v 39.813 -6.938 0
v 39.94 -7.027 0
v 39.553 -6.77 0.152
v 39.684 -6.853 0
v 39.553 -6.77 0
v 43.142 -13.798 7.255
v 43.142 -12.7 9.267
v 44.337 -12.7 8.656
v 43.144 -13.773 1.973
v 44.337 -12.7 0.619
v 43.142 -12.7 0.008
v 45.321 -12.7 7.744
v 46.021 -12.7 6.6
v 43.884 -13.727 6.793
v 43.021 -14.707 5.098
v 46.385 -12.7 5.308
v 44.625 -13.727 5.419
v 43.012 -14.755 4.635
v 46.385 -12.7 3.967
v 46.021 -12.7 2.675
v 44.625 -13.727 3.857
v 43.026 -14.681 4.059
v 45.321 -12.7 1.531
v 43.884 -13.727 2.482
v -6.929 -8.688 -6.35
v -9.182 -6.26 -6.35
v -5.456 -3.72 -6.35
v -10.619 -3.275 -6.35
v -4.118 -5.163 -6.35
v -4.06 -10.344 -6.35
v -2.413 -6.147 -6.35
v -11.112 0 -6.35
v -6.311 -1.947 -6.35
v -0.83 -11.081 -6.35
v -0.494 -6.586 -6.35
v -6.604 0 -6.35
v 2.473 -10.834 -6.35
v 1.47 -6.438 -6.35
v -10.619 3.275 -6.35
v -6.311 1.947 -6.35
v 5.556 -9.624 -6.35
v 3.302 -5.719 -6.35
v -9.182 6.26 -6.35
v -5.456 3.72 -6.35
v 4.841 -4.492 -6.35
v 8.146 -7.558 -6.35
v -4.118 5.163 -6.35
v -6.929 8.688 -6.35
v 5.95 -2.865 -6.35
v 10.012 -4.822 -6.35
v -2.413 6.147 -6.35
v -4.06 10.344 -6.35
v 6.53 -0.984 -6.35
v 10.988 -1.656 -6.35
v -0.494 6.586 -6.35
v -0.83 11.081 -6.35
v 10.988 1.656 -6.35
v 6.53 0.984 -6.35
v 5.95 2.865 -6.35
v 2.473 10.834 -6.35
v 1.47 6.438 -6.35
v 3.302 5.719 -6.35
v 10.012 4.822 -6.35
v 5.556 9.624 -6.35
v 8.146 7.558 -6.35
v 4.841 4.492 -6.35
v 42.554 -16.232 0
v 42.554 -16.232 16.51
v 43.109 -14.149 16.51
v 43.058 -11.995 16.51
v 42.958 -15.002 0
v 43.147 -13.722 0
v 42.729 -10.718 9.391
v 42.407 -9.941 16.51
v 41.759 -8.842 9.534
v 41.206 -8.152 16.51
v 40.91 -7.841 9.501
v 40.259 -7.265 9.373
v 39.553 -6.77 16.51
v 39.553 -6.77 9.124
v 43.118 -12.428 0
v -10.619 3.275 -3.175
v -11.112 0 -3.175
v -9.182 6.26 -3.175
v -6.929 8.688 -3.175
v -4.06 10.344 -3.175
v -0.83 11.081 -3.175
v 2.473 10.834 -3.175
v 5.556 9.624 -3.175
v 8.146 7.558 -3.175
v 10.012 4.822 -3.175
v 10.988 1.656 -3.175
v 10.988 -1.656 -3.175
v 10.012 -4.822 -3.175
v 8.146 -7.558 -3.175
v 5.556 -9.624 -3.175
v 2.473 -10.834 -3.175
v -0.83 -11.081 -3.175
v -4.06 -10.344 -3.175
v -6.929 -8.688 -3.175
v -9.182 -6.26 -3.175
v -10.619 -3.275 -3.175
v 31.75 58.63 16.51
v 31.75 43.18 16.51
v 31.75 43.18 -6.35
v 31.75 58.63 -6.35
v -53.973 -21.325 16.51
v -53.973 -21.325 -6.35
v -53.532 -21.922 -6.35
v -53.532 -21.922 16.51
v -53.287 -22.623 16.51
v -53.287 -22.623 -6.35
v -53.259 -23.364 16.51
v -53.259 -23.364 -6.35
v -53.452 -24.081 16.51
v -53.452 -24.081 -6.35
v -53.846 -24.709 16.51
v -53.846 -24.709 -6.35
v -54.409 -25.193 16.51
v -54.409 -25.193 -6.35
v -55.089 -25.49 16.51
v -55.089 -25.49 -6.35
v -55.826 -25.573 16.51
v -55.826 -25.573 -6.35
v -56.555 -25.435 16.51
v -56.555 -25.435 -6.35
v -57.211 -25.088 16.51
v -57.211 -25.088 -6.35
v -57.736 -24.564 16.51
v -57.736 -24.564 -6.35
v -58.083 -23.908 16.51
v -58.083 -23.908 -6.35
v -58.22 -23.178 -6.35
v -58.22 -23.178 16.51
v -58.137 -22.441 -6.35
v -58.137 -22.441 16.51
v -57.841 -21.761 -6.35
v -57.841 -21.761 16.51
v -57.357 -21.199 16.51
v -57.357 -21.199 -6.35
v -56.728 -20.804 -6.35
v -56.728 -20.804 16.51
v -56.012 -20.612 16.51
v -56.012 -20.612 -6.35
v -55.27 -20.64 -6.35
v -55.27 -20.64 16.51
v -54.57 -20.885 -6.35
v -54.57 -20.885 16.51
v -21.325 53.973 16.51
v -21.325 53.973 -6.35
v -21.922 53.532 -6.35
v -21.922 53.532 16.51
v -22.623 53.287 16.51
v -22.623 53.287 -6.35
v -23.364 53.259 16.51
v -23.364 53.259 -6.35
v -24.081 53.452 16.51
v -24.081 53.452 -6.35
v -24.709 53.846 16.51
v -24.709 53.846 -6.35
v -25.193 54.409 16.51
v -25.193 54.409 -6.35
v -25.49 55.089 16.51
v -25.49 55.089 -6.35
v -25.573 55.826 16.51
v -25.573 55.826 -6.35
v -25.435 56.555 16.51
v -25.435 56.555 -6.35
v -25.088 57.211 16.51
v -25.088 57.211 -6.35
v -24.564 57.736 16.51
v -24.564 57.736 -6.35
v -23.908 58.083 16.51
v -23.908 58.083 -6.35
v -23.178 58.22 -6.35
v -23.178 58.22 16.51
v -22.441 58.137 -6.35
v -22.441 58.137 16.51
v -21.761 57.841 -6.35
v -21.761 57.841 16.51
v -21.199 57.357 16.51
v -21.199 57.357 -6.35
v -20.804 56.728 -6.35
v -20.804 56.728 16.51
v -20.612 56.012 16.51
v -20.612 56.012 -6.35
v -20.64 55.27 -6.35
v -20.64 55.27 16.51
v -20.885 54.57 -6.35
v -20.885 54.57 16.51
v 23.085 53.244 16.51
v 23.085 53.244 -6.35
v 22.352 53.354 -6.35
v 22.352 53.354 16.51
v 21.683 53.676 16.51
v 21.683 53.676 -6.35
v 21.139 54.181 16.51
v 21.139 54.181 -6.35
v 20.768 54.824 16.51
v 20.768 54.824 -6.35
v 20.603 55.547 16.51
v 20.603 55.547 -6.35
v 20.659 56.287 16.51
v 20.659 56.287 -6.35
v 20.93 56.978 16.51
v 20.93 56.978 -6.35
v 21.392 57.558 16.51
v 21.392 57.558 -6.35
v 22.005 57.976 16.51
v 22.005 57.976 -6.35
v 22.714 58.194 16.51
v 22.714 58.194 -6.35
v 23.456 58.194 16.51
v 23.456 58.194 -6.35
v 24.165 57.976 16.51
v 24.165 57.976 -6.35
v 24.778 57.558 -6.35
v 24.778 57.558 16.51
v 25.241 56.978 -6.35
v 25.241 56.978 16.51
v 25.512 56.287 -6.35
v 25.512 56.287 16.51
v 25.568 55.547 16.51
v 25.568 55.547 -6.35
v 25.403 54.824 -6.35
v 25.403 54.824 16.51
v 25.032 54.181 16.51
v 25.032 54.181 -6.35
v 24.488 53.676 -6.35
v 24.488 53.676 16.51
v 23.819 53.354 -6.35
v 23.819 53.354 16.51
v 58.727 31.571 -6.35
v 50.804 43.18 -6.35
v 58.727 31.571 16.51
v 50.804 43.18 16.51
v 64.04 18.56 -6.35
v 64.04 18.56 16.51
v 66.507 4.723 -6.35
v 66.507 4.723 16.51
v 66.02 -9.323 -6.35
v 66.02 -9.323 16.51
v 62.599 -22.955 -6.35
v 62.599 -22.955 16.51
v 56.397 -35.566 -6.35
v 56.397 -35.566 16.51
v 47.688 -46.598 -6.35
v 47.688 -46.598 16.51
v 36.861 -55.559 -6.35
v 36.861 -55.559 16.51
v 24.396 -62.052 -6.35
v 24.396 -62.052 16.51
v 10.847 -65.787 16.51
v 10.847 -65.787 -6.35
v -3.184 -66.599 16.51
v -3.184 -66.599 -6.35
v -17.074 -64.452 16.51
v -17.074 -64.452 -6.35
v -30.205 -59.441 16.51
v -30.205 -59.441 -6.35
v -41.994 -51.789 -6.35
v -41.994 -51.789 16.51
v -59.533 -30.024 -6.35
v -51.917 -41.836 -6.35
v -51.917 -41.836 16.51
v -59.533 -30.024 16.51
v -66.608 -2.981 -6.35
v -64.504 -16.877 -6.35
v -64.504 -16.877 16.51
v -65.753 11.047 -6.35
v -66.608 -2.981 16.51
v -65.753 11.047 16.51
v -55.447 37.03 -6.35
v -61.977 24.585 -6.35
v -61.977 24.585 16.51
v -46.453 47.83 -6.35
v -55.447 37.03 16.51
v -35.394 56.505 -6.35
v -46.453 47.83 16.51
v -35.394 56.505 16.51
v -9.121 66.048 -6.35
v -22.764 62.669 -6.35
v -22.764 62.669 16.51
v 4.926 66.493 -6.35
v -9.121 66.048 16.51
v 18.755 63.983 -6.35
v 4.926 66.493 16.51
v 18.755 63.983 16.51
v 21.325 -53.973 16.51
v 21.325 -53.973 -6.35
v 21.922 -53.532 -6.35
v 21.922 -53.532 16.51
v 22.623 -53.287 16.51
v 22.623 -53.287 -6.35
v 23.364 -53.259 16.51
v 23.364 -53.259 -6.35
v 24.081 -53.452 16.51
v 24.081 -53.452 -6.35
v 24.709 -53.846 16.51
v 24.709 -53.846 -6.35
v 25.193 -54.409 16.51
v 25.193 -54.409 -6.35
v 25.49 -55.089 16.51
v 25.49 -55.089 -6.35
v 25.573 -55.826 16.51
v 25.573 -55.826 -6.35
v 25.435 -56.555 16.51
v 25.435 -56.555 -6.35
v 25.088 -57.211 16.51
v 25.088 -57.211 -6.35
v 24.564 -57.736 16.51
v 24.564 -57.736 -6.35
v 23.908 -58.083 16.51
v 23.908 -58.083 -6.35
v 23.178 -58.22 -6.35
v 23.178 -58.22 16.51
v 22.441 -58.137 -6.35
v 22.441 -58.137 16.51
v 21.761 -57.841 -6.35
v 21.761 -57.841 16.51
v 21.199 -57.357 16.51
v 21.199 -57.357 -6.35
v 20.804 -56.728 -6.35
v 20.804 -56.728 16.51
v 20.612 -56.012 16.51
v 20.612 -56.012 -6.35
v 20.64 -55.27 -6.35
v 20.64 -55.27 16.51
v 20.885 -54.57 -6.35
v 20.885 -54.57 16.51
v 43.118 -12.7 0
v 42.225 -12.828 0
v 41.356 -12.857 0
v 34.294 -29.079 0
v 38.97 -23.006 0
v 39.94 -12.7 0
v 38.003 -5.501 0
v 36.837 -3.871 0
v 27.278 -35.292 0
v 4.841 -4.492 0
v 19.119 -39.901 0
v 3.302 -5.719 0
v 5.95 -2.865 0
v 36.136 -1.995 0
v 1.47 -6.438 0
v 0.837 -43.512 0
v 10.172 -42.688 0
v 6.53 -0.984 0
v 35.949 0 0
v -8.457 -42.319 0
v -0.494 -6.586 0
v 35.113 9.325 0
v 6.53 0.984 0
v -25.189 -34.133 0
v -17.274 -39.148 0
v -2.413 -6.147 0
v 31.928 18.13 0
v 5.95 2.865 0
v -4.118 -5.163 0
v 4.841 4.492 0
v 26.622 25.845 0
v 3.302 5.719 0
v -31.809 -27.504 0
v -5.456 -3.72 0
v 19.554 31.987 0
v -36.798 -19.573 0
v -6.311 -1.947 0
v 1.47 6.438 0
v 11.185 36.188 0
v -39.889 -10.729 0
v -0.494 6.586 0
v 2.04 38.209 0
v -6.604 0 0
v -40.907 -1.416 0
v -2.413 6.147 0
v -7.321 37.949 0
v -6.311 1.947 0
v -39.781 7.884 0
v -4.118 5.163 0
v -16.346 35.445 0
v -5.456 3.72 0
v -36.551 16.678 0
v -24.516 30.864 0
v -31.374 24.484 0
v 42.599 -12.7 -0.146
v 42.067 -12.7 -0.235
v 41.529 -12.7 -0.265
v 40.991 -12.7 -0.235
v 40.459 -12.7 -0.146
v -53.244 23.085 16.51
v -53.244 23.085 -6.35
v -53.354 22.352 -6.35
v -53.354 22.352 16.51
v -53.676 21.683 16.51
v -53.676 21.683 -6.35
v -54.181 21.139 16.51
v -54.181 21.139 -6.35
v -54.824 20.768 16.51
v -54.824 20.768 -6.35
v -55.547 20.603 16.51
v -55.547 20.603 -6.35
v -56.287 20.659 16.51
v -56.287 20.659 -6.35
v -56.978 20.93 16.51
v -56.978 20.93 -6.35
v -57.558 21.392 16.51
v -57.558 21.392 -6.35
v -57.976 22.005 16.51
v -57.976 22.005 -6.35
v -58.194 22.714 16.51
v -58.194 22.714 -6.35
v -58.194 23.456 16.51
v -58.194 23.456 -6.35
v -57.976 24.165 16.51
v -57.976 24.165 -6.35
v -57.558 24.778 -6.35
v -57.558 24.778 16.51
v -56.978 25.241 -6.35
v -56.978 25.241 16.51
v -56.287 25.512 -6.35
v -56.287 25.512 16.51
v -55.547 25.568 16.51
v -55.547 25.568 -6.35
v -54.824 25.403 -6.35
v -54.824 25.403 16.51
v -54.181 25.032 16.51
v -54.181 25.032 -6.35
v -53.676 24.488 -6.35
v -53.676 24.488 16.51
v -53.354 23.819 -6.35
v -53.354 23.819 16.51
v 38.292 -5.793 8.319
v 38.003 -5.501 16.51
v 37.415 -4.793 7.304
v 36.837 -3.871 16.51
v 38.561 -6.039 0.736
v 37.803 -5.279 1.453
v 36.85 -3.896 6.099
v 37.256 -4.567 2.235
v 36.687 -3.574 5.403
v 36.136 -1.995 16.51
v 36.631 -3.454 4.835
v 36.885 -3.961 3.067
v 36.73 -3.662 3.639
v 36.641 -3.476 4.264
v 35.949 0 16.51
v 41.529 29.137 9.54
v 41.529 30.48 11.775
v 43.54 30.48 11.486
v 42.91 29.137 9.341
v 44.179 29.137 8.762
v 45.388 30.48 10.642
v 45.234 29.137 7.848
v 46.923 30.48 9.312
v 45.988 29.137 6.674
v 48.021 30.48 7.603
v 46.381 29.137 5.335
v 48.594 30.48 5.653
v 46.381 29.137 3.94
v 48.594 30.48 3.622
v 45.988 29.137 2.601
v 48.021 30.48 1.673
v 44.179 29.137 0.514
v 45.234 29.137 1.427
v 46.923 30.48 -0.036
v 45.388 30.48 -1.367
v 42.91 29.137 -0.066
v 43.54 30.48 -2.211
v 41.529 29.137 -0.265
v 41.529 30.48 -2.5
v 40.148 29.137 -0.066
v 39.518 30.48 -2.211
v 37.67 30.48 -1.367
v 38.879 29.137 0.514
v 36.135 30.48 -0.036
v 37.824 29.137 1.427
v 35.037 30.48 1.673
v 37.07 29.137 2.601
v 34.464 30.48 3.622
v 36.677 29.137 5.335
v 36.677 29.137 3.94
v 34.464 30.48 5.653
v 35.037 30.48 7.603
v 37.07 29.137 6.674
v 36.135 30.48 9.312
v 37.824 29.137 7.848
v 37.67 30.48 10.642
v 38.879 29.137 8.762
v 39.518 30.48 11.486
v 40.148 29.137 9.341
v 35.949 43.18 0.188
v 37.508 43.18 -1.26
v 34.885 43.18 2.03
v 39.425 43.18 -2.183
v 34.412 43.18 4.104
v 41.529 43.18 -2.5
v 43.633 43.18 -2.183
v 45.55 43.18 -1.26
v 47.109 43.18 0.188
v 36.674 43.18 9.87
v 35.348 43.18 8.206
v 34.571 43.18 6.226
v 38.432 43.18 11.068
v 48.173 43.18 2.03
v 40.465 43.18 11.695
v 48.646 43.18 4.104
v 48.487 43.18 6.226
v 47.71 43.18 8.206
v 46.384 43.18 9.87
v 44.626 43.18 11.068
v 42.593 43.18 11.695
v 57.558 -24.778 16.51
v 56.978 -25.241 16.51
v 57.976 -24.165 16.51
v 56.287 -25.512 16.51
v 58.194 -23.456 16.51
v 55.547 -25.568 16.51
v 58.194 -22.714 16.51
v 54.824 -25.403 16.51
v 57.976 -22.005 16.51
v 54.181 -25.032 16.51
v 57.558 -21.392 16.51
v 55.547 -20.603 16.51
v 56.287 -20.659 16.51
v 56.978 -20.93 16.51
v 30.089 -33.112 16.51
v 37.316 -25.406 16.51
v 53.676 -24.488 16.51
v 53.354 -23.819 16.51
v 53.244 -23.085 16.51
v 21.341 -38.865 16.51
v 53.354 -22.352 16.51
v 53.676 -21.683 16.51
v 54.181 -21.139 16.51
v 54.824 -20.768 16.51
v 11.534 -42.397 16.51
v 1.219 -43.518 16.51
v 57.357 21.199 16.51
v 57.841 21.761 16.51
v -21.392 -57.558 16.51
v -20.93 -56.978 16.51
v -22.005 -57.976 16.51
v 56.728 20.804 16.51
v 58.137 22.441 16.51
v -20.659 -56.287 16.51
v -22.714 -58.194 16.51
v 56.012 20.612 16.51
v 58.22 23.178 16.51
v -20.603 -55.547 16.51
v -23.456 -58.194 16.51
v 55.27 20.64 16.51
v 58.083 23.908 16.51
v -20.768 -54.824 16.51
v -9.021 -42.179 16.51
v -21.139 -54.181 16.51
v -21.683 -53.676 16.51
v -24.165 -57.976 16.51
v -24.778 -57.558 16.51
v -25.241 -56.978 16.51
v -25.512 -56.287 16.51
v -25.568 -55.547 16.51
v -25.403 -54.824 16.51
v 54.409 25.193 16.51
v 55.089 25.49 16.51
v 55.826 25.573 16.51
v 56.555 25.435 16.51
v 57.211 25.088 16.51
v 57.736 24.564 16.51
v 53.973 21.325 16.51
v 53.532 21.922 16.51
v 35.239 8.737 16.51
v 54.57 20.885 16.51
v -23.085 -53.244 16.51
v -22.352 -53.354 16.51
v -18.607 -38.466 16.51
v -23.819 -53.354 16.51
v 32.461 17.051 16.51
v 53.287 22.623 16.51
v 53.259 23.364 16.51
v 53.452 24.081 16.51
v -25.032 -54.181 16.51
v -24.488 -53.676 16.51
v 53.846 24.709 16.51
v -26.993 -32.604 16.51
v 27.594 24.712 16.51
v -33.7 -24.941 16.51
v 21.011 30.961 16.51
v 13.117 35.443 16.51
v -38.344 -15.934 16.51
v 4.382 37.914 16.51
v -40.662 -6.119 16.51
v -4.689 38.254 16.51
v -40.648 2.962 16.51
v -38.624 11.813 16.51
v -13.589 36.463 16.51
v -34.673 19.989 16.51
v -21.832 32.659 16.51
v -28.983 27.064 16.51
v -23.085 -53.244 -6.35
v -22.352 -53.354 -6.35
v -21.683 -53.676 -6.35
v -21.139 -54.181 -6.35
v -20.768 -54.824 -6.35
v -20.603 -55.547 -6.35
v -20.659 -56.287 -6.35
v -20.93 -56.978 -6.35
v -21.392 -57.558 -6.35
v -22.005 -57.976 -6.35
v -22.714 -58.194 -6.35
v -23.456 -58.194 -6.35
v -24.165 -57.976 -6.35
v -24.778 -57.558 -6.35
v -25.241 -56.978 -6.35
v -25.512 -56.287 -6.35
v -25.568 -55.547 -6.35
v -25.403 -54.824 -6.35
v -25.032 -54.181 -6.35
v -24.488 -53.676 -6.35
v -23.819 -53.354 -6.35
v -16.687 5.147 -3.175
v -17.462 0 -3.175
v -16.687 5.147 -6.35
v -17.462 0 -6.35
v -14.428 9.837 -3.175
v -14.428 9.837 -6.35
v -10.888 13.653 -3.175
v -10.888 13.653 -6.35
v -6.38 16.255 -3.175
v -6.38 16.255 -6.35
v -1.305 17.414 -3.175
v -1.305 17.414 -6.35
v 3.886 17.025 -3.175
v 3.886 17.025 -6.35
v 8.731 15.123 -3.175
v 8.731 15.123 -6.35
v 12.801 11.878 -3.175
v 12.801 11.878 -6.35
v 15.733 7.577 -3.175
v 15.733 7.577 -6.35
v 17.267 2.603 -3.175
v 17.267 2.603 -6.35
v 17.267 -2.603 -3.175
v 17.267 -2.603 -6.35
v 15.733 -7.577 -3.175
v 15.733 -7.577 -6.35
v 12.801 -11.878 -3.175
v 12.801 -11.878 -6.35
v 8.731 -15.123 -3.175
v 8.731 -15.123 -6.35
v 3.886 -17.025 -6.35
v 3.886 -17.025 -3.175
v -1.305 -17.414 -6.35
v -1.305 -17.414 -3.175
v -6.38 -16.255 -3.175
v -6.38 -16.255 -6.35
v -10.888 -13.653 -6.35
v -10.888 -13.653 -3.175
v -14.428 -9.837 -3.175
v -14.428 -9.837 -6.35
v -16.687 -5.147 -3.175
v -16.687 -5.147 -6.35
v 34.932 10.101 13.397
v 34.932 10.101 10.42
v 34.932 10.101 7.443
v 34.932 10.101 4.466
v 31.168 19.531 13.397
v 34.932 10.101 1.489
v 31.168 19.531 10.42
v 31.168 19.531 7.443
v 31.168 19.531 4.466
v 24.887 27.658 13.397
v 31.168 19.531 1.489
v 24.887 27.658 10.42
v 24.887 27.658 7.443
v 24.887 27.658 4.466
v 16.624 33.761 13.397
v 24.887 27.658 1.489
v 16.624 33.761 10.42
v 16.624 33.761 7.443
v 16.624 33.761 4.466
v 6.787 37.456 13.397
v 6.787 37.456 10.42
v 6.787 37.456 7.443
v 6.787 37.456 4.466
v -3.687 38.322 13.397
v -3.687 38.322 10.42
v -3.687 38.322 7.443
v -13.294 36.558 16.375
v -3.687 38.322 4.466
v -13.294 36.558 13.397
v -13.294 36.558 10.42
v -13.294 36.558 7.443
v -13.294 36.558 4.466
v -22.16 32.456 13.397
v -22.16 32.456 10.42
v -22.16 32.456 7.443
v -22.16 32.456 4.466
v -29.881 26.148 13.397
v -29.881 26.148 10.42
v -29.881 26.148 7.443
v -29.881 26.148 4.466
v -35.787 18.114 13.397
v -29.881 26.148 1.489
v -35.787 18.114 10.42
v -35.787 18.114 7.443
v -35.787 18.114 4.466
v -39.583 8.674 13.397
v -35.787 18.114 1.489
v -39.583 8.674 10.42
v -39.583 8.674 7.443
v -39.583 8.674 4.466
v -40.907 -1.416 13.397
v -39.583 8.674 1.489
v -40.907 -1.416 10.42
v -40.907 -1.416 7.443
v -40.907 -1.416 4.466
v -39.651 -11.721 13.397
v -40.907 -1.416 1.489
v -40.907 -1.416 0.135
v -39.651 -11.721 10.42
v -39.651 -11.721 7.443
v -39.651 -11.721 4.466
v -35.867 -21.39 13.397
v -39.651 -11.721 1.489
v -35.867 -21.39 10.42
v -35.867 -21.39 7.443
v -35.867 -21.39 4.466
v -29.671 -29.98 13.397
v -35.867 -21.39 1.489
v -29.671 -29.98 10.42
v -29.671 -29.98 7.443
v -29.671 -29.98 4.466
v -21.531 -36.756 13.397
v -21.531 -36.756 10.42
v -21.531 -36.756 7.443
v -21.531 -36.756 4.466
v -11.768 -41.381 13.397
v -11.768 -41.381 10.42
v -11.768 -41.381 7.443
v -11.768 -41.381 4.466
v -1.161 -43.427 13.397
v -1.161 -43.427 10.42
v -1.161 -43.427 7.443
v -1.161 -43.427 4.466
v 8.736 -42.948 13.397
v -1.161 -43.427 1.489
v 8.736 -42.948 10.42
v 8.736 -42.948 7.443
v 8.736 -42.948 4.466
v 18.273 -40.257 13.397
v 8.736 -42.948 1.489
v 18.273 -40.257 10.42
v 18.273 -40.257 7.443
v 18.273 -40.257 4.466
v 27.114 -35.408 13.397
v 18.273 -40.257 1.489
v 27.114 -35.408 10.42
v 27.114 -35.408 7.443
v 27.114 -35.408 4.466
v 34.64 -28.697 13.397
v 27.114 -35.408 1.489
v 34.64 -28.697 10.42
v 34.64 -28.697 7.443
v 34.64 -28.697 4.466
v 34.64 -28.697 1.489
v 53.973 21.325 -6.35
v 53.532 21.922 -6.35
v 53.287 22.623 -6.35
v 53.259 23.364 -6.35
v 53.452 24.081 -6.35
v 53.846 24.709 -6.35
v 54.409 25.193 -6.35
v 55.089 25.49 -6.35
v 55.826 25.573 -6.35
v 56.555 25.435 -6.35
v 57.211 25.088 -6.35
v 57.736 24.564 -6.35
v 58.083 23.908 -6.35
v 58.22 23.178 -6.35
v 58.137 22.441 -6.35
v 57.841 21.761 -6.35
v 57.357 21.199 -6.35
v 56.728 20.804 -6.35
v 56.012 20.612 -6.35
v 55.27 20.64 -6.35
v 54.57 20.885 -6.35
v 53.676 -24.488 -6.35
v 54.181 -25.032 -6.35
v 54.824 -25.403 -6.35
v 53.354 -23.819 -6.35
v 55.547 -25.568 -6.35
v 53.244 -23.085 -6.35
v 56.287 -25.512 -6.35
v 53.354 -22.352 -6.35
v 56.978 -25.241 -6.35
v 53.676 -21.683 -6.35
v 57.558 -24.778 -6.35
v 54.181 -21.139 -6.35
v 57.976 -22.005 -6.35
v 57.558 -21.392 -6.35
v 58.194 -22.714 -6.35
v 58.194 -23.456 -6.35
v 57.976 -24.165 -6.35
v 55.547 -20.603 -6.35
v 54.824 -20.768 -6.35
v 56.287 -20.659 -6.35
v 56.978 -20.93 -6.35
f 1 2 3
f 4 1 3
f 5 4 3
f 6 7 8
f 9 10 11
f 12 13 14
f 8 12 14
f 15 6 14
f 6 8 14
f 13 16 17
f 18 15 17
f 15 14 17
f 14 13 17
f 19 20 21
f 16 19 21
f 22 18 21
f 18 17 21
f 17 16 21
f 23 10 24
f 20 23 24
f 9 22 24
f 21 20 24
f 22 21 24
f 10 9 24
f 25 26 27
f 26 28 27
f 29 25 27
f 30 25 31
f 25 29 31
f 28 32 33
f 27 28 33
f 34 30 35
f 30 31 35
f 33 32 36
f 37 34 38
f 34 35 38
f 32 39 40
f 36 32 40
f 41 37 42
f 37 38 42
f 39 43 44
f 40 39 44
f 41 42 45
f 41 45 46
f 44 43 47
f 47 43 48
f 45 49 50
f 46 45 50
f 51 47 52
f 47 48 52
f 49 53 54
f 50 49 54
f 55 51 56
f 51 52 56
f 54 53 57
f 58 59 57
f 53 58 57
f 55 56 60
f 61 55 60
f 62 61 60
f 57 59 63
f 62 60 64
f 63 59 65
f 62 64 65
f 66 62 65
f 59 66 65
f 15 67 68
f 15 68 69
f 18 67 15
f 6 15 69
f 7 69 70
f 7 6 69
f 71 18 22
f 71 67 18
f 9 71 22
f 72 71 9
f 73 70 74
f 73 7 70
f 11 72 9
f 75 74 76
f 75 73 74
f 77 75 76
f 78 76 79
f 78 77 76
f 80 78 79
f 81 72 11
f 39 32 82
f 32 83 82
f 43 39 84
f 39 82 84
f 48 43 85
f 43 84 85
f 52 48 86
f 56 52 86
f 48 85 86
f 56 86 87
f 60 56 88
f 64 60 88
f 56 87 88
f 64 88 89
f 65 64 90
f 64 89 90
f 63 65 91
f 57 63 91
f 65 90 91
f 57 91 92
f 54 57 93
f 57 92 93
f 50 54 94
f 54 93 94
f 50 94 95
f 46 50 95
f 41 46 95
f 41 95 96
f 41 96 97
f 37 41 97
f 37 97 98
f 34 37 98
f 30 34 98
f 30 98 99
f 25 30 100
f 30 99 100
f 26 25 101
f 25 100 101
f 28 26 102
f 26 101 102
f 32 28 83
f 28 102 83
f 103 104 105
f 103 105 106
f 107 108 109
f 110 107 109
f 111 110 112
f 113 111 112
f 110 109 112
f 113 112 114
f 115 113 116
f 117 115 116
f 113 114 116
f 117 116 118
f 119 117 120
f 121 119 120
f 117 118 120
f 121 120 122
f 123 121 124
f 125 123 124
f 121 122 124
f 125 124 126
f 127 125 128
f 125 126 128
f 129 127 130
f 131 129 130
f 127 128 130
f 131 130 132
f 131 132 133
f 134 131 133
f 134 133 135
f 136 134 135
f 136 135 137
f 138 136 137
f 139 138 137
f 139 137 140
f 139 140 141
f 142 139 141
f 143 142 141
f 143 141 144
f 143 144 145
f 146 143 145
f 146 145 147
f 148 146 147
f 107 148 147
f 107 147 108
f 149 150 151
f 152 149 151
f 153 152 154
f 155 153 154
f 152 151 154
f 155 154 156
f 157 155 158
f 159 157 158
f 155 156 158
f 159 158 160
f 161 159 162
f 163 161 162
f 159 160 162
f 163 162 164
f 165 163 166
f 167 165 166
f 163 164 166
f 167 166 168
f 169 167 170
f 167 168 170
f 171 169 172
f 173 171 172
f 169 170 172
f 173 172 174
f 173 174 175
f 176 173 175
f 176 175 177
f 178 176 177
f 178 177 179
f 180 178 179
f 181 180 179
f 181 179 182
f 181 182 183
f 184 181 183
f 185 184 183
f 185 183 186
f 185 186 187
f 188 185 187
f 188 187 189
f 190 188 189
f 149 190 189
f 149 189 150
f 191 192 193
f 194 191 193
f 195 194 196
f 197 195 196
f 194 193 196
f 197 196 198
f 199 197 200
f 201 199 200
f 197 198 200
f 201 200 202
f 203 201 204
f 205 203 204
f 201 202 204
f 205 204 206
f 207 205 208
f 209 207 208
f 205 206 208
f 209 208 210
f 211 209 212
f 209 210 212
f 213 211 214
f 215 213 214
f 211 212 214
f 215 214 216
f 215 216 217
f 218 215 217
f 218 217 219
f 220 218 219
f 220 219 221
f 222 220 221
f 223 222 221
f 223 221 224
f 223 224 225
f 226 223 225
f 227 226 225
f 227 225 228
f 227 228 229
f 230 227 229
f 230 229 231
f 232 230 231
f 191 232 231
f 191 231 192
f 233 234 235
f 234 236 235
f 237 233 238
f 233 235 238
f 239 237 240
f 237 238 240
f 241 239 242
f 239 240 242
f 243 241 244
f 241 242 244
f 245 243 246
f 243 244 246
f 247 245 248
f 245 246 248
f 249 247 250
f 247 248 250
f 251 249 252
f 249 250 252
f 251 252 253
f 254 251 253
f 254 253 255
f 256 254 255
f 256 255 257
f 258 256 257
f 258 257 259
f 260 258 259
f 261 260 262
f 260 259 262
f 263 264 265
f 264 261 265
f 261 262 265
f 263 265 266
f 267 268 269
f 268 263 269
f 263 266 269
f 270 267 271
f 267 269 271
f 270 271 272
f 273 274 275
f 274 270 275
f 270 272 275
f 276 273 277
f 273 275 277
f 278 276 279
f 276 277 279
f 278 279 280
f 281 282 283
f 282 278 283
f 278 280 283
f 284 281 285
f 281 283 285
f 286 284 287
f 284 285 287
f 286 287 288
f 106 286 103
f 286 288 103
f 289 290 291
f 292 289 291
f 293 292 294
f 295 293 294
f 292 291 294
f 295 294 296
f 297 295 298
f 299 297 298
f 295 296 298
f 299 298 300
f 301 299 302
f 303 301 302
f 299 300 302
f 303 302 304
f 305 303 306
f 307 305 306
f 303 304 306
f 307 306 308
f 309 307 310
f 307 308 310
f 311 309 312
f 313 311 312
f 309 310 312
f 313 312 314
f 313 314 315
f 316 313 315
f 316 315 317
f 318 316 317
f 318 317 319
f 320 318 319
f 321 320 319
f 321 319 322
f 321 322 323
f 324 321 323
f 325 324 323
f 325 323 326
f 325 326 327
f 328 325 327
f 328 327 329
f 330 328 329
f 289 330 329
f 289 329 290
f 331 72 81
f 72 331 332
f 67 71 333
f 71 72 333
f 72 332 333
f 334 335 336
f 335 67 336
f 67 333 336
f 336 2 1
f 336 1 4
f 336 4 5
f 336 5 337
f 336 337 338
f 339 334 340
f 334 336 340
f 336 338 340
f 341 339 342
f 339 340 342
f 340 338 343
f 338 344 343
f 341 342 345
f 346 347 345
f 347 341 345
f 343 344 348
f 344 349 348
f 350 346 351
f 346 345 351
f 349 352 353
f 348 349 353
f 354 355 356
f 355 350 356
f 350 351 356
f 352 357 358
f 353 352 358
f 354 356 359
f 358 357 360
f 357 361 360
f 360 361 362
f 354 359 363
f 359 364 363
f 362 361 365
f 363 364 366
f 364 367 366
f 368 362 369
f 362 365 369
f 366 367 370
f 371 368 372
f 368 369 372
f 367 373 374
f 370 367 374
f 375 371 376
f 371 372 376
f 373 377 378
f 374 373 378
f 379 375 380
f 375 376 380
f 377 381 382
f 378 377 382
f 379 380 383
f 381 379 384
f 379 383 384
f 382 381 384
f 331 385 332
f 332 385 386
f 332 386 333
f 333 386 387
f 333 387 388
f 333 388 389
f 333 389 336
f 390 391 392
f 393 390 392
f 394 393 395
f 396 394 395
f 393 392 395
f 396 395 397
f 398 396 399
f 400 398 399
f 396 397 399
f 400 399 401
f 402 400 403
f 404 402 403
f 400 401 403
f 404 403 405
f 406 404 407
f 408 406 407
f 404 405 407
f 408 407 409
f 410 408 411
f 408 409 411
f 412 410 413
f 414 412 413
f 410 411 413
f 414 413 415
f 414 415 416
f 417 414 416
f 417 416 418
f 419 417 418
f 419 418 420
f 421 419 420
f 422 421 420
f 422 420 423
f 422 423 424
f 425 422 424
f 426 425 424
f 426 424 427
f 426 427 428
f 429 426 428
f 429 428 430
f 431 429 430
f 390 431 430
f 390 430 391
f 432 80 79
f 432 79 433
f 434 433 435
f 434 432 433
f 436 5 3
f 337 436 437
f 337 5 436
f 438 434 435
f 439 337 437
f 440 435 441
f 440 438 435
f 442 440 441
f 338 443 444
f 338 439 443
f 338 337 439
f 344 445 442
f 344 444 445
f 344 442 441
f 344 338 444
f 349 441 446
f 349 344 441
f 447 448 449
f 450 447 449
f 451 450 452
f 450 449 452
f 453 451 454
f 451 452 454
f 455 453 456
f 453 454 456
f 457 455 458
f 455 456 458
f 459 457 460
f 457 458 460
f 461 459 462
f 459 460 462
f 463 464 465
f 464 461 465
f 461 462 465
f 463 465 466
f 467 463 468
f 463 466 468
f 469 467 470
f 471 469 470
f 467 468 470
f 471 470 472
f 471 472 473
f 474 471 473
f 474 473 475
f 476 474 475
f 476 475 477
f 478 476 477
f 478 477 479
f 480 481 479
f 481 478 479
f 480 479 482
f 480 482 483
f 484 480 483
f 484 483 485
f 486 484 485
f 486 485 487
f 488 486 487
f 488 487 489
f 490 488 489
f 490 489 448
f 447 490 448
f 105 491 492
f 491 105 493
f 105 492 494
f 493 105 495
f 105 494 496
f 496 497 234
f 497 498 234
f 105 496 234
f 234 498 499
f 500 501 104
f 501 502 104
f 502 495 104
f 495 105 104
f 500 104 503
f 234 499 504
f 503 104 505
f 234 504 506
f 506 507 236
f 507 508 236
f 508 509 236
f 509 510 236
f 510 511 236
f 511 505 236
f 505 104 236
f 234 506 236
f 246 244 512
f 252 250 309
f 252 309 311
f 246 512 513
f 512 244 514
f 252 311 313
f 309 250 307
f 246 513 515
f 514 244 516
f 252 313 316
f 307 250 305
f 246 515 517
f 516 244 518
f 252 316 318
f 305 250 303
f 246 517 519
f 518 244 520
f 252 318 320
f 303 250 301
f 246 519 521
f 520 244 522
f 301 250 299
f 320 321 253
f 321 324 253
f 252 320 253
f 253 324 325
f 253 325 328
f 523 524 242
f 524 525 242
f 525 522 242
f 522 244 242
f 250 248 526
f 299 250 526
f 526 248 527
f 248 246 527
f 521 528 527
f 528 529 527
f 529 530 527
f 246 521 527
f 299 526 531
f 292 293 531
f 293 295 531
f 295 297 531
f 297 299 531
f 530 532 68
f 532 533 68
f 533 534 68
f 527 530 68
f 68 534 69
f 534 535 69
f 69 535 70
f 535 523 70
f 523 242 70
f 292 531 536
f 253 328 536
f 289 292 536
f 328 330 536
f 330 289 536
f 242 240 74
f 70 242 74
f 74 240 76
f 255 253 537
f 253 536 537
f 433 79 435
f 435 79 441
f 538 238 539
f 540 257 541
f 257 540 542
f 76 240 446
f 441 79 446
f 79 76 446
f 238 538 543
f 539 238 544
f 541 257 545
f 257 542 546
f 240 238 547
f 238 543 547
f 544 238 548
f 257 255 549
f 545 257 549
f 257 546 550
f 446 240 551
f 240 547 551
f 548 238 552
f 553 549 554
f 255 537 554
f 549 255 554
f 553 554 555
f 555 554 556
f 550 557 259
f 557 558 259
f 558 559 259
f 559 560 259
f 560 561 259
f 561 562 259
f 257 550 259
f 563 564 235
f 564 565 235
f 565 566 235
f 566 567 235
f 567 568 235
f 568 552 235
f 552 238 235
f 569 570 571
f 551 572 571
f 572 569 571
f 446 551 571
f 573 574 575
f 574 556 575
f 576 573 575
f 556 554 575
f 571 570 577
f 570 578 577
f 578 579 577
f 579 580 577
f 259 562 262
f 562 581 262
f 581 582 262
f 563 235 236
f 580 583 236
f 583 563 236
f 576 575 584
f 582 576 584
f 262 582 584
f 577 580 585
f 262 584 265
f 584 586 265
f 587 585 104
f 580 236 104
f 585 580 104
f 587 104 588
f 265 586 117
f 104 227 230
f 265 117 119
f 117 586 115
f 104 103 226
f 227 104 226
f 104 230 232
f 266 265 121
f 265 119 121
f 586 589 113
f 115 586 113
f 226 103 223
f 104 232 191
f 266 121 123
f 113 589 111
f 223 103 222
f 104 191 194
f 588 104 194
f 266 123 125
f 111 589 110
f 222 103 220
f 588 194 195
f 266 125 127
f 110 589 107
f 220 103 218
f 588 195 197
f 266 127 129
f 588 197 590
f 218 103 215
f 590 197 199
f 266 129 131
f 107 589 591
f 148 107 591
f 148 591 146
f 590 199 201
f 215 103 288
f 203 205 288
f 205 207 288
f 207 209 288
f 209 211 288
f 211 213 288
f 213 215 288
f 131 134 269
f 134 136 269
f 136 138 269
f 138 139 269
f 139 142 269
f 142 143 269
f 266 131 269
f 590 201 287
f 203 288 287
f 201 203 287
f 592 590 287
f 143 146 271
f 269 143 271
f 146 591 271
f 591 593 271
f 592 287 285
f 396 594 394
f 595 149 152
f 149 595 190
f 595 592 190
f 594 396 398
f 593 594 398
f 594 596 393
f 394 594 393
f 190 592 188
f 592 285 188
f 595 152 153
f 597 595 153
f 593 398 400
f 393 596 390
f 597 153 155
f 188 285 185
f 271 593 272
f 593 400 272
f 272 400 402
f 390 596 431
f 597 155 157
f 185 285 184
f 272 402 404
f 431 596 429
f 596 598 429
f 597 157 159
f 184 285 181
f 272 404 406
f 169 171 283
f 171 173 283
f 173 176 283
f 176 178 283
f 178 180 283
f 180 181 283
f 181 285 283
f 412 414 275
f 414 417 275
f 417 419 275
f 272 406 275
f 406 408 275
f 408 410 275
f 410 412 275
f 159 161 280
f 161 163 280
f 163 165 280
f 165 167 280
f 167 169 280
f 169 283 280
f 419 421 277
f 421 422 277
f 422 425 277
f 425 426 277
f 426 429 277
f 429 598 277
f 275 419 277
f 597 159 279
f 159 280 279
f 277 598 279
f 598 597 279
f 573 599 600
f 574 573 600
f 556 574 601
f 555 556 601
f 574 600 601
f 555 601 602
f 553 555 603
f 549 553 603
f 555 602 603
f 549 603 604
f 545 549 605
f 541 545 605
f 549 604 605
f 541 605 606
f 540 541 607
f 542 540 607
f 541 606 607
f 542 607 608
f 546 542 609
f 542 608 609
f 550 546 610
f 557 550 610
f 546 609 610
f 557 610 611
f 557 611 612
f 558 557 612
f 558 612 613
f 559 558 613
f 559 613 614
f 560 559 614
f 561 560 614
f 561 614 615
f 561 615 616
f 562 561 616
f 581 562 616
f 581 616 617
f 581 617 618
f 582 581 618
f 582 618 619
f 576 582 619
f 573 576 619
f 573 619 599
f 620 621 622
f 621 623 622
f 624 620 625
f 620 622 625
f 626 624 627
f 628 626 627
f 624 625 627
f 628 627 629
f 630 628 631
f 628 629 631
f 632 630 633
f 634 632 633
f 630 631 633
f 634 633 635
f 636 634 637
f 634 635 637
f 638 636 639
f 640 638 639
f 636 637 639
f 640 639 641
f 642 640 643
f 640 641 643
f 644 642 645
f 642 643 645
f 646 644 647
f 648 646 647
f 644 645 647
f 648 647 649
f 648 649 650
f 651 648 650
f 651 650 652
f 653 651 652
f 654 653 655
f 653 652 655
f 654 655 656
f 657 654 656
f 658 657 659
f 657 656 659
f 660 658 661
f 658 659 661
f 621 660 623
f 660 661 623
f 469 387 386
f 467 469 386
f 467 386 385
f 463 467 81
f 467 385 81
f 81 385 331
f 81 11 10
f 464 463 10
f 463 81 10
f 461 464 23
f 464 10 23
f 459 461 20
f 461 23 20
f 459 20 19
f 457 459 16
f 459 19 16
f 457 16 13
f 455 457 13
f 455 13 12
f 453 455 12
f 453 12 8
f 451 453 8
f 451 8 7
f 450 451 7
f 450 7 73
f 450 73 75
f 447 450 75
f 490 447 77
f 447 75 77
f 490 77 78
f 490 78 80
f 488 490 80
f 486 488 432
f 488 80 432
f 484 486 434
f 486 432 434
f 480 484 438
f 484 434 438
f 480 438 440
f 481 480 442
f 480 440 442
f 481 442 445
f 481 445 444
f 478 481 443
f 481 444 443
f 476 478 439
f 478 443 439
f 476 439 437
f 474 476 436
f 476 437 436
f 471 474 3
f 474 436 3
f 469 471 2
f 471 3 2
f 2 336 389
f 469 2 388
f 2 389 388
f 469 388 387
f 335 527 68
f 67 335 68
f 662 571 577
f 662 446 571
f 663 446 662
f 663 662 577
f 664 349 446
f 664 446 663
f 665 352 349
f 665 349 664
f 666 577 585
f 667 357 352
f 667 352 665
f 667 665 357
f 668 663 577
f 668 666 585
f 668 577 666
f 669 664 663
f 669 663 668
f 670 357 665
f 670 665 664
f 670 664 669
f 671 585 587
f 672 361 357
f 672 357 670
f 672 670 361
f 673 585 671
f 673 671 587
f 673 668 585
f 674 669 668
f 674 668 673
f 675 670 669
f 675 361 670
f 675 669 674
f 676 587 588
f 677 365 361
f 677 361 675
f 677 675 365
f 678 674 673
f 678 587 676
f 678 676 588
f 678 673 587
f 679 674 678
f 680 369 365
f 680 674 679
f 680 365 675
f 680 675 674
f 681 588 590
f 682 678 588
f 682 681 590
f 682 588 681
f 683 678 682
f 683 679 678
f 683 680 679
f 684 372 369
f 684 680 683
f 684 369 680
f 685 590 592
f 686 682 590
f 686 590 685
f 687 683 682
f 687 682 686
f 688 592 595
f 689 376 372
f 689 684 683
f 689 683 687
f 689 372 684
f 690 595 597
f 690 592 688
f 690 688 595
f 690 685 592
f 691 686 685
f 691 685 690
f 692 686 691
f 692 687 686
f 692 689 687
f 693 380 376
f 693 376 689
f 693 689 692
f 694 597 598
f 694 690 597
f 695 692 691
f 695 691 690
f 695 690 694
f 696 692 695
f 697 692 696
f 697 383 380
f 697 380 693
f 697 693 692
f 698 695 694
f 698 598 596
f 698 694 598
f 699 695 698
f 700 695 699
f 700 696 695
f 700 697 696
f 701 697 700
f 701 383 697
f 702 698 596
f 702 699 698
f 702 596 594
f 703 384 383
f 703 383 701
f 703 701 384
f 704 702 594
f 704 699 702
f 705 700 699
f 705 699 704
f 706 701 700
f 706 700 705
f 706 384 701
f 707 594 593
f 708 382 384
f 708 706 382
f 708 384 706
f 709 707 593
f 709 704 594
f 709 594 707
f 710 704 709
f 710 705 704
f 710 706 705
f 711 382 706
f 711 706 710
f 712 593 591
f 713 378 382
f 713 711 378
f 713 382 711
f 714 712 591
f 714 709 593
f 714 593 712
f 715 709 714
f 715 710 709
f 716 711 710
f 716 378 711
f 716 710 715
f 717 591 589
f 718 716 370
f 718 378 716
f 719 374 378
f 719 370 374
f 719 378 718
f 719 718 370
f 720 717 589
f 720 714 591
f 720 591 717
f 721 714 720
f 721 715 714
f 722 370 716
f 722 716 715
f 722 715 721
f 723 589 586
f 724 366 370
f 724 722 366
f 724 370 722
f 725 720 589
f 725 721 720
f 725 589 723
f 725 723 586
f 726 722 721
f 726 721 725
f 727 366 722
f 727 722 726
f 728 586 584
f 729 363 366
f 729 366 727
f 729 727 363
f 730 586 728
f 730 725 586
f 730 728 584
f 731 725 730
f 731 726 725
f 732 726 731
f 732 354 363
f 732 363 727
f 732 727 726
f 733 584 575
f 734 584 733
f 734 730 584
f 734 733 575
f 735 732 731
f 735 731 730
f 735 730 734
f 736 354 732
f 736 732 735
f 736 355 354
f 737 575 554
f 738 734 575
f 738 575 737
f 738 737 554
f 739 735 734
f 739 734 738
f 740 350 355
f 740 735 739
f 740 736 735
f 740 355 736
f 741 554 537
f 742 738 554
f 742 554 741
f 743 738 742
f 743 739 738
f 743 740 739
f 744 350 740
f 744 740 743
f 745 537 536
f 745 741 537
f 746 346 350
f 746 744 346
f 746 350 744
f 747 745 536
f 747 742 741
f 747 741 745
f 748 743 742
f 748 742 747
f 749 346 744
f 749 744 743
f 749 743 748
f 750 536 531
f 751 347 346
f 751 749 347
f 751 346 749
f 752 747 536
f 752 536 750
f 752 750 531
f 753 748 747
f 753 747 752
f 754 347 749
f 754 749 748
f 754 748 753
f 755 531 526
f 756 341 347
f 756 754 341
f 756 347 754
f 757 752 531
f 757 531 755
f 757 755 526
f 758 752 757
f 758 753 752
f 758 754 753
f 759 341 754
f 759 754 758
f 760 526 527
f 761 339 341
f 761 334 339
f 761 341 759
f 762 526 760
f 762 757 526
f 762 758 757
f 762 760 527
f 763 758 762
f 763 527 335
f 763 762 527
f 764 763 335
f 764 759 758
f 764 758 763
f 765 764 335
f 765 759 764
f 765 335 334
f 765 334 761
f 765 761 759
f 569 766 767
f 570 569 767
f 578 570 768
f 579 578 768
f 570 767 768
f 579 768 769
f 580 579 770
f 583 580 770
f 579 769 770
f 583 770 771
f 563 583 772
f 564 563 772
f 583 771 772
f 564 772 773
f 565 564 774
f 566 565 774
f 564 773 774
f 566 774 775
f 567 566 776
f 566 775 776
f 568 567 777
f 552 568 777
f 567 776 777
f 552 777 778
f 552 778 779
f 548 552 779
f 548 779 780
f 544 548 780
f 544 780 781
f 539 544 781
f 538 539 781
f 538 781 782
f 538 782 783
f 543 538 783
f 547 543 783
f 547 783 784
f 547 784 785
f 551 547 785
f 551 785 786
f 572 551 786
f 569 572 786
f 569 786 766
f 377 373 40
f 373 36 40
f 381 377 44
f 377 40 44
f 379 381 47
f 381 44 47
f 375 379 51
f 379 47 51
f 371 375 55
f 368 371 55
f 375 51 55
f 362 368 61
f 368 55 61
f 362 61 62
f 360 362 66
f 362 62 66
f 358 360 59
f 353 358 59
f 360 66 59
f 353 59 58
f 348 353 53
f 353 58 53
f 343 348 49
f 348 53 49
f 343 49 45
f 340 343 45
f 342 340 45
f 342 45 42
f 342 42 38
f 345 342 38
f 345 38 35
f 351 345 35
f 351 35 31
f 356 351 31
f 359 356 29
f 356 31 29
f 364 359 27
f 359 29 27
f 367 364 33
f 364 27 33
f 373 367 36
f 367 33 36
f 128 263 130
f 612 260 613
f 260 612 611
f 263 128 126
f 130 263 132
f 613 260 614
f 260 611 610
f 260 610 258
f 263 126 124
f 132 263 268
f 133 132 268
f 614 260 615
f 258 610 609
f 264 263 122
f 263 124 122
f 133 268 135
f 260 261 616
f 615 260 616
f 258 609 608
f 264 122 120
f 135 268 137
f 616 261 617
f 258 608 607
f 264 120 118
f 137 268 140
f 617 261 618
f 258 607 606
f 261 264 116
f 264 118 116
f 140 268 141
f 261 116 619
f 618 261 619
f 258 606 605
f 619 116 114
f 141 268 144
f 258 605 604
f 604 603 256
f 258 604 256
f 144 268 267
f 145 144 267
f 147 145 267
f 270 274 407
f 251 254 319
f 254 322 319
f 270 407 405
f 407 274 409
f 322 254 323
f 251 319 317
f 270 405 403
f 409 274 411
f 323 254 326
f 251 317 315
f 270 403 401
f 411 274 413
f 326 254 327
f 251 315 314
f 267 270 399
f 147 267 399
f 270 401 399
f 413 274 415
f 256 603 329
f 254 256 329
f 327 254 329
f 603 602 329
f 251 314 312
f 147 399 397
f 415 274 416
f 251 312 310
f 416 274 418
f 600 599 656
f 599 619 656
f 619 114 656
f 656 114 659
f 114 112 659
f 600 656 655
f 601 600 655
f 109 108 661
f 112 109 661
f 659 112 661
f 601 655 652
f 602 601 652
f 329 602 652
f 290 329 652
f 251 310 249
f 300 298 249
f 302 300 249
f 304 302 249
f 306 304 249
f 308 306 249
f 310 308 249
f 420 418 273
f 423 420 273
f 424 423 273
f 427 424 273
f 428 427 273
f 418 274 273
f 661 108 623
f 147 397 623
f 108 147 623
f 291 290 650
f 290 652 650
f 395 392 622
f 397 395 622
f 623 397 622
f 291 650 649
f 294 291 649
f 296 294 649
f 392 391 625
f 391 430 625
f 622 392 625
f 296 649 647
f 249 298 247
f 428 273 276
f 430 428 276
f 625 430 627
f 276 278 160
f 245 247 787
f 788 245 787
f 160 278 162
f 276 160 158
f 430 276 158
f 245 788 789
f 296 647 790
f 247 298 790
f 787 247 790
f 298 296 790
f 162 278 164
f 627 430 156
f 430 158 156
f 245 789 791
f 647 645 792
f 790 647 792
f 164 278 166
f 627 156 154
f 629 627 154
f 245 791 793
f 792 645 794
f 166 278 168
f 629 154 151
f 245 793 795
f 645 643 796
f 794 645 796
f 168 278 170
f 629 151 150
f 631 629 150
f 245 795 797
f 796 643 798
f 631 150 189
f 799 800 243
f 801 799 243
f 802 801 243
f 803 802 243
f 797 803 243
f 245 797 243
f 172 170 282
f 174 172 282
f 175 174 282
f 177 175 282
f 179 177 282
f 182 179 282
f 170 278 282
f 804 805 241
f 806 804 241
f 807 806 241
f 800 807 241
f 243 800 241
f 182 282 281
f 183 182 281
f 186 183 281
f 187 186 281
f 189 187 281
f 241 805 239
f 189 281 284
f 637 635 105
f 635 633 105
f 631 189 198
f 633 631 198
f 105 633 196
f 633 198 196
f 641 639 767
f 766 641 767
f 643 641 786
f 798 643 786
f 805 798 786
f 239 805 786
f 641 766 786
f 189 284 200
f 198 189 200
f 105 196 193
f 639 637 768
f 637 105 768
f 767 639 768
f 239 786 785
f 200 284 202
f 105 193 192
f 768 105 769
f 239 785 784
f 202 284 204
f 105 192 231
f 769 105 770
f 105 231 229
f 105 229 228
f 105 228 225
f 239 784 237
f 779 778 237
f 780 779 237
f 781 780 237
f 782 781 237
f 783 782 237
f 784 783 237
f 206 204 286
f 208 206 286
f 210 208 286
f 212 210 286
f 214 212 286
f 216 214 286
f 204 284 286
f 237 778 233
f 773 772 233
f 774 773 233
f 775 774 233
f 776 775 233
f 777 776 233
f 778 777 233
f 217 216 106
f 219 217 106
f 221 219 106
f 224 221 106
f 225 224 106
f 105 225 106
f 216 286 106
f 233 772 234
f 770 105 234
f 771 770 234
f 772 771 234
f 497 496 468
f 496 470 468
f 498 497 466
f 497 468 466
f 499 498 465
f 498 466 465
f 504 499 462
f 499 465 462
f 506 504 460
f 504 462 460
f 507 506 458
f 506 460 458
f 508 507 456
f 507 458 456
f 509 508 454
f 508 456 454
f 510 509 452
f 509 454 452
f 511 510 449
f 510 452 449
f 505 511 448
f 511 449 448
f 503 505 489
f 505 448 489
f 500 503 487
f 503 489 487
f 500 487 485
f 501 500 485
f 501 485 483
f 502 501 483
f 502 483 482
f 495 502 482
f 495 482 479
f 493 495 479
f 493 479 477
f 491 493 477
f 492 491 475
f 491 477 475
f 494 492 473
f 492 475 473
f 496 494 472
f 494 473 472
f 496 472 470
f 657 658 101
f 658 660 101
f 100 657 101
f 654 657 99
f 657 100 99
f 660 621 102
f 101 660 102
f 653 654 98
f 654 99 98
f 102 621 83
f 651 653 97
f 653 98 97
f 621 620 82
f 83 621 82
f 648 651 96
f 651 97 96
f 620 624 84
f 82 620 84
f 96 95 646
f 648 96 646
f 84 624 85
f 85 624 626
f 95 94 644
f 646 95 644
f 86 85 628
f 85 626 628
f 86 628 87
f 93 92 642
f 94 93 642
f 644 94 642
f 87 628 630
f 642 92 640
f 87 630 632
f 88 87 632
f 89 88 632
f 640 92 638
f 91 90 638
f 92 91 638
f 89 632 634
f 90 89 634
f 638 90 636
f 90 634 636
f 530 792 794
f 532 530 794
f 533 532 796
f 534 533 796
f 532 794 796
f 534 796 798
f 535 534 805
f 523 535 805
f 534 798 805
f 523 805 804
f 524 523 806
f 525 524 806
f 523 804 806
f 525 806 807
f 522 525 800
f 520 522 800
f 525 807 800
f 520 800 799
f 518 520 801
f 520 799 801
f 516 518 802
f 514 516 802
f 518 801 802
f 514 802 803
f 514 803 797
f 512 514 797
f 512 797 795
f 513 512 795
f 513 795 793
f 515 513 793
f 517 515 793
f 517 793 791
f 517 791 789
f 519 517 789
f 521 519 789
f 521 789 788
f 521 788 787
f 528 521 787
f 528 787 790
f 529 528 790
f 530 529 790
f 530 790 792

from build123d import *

# Parameters (mm, degrees)
SKETCH23_R            = 25.4
VOLUTE_CUT_DEPTH      = 17.51
SKETCH28_W            = 19.053968595
SKETCH28_H            = 15.450138368
OUTLET_HOLE_CUT_DEPTH = 23.86
OUTLET_HOLE_D         = 9.8044
OUTLET_HOLE_DEPTH     = 55.88
OUTLET_HOLE_TIP       = 2.945538927
OUTLET_NPT_D          = 14.2748
OUTLET_NPT_DEPTH      = 12.7
OUTLET_NPT_TIP        = 4.288582582
FASTENER_HOLES_D      = 4.9784
CIRPATTERN1_COUNT     = 8


with BuildPart() as part:
    # Sketch22 → Main Body (revolve)
    with BuildSketch(Plane(origin=(0, 0, 0), x_dir=(1, 0, 0), z_dir=(0, 1, 0))):
        Polygon((-25.4, 0), (-6.604, 0), (-6.604, 6.35), (-11.1125, 6.35), (-11.1125, 3.175), (-17.4625, 3.175), (-17.4625, 6.35), (-66.675, 6.35), (-66.675, -16.51), (-25.4, -16.51), align=None)
    revolve(axis=Axis((0, 0, 0), (0, 0, -1)))

    # Sketch23 → Volute Cut (cut, through all)
    with BuildSketch(Plane.XY):
        with BuildLine():
            ThreePointArc((42.554027377, -16.231646763), (42.805320101, -10.94498561), (39.552581276, -6.769865934))
            ThreePointArc((39.552581276, -6.769865934), (36.836858206, -3.87137787), (35.948703812, 0))
            add(Edge.make_bspline(
                [(35.948703812, 0), (35.9515816, 0.07538119), (35.957337916, 0.226162951), (35.964207937, 0.452426553), (35.969771157, 0.678783022), (35.978029534, 1.131847853), (35.980843708, 2.190601907), (35.920311441, 3.779931016), (35.747323363, 5.668216834), (35.489928088, 7.474298946), (35.141459932, 9.268877369), (34.702390603, 11.047358984), (34.17343386, 12.80516853), (33.555538624, 14.537761538), (32.849887572, 16.240636382), (32.057893687, 17.909346365), (31.181197352, 19.53951152), (30.221662701, 21.126830276), (29.181373626, 22.667090912), (28.062629225, 24.156182809), (26.867938753, 25.590107465), (25.60001603, 26.964989265), (24.261773335, 28.277085961), (22.856314773, 29.522798851), (21.386929147, 30.698682629), (19.85708232, 31.801454876), (18.270409111, 32.828005175), (16.630704717, 33.775403815), (14.941915703, 34.640910073), (13.208130556, 35.421980041), (11.43356985, 36.116273987), (9.622576022, 36.721663214), (7.779602801, 37.236236415), (5.909204301, 37.658305492), (4.016023818, 37.986410831), (2.104782347, 38.219326014), (0.180266852, 38.356061949), (-1.75268168, 38.395870413), (-3.689180377, 38.338246992), (-5.624316777, 38.182933409), (-7.553161251, 37.929919231), (-9.470779522, 37.579442948), (-11.37224525, 37.131992419), (-13.252652651, 36.588304682), (-15.107129112, 35.949365124), (-16.930847778, 35.216406011), (-18.719040078, 34.390904381), (-20.467008144, 33.474579298), (-22.170137115, 32.469388481), (-23.823907266, 31.377524301), (-25.42390596, 30.201409162), (-26.965839357, 28.943690275), (-28.445543888, 27.607233836), (-29.858997424, 26.195118613), (-31.202330147, 24.710628968), (-32.471835063, 23.157247319), (-33.663978152, 21.538646066), (-34.775408104, 19.858679), (-35.802965645, 18.121372202), (-36.743692396, 16.330914471), (-37.594839261, 14.491647299), (-38.353874308, 12.608054401), (-39.018490139, 10.68475085), (-39.586610697, 8.726471825), (-40.056397525, 6.738061006), (-40.426255434, 4.724458642), (-40.694837576, 2.690689328), (-40.861049894, 0.641849508), (-40.924054953, -1.416905249), (-40.883275123, -3.480373184), (-40.738395114, -5.543319447), (-40.489363842, -7.600489337), (-40.13639564, -9.646621653), (-39.679970776, -11.676462103), (-39.120835312, -13.684776759), (-38.460000265, -15.666365517), (-37.698740094, -17.61607551), (-36.838590511, -19.528814477), (-35.881345602, -21.399564006), (-34.829054288, -23.223392663), (-33.684016107, -24.995468936), (-32.44877635, -26.711073982), (-31.126120537, -28.365614138), (-29.719068263, -29.954633155), (-28.230866416, -31.473824138), (-26.664981791, -32.919041144), (-25.025093105, -34.286310417), (-23.315082441, -35.571841228), (-21.53902614, -36.772036288), (-19.701185153, -37.883501708), (-17.805994889, -38.903056478), (-15.85805457, -39.827741435), (-13.862116128, -40.654827709), (-11.823072667, -41.381824596), (-9.745946518, -42.006486871), (-7.635876912, -42.526821485), (-5.498107312, -42.941093656), (-3.337972426, -43.247832311), (-1.160884928, -43.445834888), (1.027678058, -43.534171454), (3.222188708, -43.512188152), (5.417082419, -43.379509955), (7.606771886, -43.136042707), (9.785661288, -42.781974466), (11.948160555, -42.317776118), (14.08869967, -41.74420128), (16.201742982, -41.062285471), (18.281803484, -40.273344558), (20.323457017, -39.378972487), (22.321356376, -38.381038284), (24.27024527, -37.281682345), (26.164972102, -36.083312015), (28.000503535, -34.788596469), (29.77193781, -33.400460899), (31.474517775, -31.92208003), (33.103643596, -30.356870964), (34.654885111, -28.708485383), (36.123993806, -26.980801118), (37.506914359, -25.17791311), (38.799795742, -23.304123775), (39.999001844, -21.363932809), (41.101121576, -19.362026441), (41.938186302, -17.641904891), (42.402189205, -16.588613759), (42.554027377, -16.231646763)],
                knots=[0, 0, 0, 0, 0.000879209, 0.001758645, 0.002638305, 0.003518191, 0.007039982, 0.014977213, 0.022047939, 0.029133237, 0.036233164, 0.043347773, 0.050477114, 0.057621232, 0.06478017, 0.071953969, 0.079142669, 0.086346306, 0.093564916, 0.100798534, 0.108047194, 0.115310927, 0.122589766, 0.12988374, 0.13719288, 0.144517215, 0.151856774, 0.159211583, 0.16658167, 0.173967063, 0.181367786, 0.188783866, 0.196215328, 0.203662198, 0.211124498, 0.218602253, 0.226095488, 0.233604225, 0.241128486, 0.248668296, 0.256223676, 0.263794648, 0.271381234, 0.278983456, 0.286601335, 0.294234891, 0.301884146, 0.309549121, 0.317229835, 0.324926308, 0.332638561, 0.340366614, 0.348110485, 0.355870195, 0.363645762, 0.371437205, 0.379244543, 0.387067795, 0.39490698, 0.402762115, 0.410633219, 0.41852031, 0.426423405, 0.434342523, 0.442277682, 0.450228898, 0.458196189, 0.466179572, 0.474179065, 0.482194684, 0.490226447, 0.498274369, 0.506338468, 0.514418761, 0.522515263, 0.530627991, 0.538756962, 0.546902191, 0.555063694, 0.563241488, 0.571435588, 0.57964601, 0.58787277, 0.596115883, 0.604375364, 0.61265123, 0.620943495, 0.629252175, 0.637577285, 0.64591884, 0.654276855, 0.662651345, 0.671042324, 0.679449808, 0.687873812, 0.696314349, 0.704771435, 0.713245083, 0.721735309, 0.730242127, 0.738765551, 0.747305595, 0.755862273, 0.7644356, 0.77302559, 0.781632256, 0.790255613, 0.798895674, 0.807552454, 0.816225965, 0.824916222, 0.833623239, 0.842347028, 0.851087604, 0.859844979, 0.868619169, 0.877410184, 0.88621804, 0.895042749, 0.903884325, 0.912742781, 0.921618129, 0.930510383, 0.935031581, 0.935031581, 0.935031581, 0.935031581], degree=3))
        make_face()
        Circle(SKETCH23_R, mode=Mode.SUBTRACT)
    extrude(amount=VOLUTE_CUT_DEPTH, mode=Mode.SUBTRACT)

    # Sketch28 → Outlet Hole Cut (cut, through all)
    with BuildSketch(Plane.XY.offset(16.51)):
        with Locations((41.276984298, 50.905069184)):
            Rectangle(SKETCH28_W, SKETCH28_H)
    extrude(amount=-OUTLET_HOLE_CUT_DEPTH, mode=Mode.SUBTRACT)

    # Outlet Hole
    with Locations(Plane(origin=(41.529, 43.18, 4.637659), x_dir=(0, 0, 1), z_dir=(0, 1, 0))):
        with Locations((0, 0)):
            Hole(OUTLET_HOLE_D / 2, depth=OUTLET_HOLE_DEPTH)
            with Locations((0, 0, -(OUTLET_HOLE_DEPTH + OUTLET_HOLE_TIP / 2))):  # 118° drill point
                Cone(0, OUTLET_HOLE_D / 2, OUTLET_HOLE_TIP, mode=Mode.SUBTRACT)

    # Outlet NPT
    with Locations(Plane(origin=(41.529, 43.18, 4.637659), x_dir=(0, 0, 1), z_dir=(0, 1, 0))):
        with Locations((0, 0)):
            Hole(OUTLET_NPT_D / 2, depth=OUTLET_NPT_DEPTH)
            with Locations((0, 0, -(OUTLET_NPT_DEPTH + OUTLET_NPT_TIP / 2))):  # 118° drill point
                Cone(0, OUTLET_NPT_D / 2, OUTLET_NPT_TIP, mode=Mode.SUBTRACT)

    # Fastener Holes (through all)
    with Locations(Plane(origin=(55.733032799, -23.085378057, 16.51), x_dir=(1, 0, 0), z_dir=(0, 0, 1))):
        with Locations((0, 0)):
            fastener_holes = Hole(FASTENER_HOLES_D / 2)

    # CirPattern1: Fastener Holes ×8 about axis
    cirpattern1_axis = Axis((0, 0, 0), (0, 0, 1))
    for i in range(1, CIRPATTERN1_COUNT):
        add(fastener_holes.rotate(cirpattern1_axis, i * 360 / CIRPATTERN1_COUNT), mode=Mode.SUBTRACT)


solid = part.part
